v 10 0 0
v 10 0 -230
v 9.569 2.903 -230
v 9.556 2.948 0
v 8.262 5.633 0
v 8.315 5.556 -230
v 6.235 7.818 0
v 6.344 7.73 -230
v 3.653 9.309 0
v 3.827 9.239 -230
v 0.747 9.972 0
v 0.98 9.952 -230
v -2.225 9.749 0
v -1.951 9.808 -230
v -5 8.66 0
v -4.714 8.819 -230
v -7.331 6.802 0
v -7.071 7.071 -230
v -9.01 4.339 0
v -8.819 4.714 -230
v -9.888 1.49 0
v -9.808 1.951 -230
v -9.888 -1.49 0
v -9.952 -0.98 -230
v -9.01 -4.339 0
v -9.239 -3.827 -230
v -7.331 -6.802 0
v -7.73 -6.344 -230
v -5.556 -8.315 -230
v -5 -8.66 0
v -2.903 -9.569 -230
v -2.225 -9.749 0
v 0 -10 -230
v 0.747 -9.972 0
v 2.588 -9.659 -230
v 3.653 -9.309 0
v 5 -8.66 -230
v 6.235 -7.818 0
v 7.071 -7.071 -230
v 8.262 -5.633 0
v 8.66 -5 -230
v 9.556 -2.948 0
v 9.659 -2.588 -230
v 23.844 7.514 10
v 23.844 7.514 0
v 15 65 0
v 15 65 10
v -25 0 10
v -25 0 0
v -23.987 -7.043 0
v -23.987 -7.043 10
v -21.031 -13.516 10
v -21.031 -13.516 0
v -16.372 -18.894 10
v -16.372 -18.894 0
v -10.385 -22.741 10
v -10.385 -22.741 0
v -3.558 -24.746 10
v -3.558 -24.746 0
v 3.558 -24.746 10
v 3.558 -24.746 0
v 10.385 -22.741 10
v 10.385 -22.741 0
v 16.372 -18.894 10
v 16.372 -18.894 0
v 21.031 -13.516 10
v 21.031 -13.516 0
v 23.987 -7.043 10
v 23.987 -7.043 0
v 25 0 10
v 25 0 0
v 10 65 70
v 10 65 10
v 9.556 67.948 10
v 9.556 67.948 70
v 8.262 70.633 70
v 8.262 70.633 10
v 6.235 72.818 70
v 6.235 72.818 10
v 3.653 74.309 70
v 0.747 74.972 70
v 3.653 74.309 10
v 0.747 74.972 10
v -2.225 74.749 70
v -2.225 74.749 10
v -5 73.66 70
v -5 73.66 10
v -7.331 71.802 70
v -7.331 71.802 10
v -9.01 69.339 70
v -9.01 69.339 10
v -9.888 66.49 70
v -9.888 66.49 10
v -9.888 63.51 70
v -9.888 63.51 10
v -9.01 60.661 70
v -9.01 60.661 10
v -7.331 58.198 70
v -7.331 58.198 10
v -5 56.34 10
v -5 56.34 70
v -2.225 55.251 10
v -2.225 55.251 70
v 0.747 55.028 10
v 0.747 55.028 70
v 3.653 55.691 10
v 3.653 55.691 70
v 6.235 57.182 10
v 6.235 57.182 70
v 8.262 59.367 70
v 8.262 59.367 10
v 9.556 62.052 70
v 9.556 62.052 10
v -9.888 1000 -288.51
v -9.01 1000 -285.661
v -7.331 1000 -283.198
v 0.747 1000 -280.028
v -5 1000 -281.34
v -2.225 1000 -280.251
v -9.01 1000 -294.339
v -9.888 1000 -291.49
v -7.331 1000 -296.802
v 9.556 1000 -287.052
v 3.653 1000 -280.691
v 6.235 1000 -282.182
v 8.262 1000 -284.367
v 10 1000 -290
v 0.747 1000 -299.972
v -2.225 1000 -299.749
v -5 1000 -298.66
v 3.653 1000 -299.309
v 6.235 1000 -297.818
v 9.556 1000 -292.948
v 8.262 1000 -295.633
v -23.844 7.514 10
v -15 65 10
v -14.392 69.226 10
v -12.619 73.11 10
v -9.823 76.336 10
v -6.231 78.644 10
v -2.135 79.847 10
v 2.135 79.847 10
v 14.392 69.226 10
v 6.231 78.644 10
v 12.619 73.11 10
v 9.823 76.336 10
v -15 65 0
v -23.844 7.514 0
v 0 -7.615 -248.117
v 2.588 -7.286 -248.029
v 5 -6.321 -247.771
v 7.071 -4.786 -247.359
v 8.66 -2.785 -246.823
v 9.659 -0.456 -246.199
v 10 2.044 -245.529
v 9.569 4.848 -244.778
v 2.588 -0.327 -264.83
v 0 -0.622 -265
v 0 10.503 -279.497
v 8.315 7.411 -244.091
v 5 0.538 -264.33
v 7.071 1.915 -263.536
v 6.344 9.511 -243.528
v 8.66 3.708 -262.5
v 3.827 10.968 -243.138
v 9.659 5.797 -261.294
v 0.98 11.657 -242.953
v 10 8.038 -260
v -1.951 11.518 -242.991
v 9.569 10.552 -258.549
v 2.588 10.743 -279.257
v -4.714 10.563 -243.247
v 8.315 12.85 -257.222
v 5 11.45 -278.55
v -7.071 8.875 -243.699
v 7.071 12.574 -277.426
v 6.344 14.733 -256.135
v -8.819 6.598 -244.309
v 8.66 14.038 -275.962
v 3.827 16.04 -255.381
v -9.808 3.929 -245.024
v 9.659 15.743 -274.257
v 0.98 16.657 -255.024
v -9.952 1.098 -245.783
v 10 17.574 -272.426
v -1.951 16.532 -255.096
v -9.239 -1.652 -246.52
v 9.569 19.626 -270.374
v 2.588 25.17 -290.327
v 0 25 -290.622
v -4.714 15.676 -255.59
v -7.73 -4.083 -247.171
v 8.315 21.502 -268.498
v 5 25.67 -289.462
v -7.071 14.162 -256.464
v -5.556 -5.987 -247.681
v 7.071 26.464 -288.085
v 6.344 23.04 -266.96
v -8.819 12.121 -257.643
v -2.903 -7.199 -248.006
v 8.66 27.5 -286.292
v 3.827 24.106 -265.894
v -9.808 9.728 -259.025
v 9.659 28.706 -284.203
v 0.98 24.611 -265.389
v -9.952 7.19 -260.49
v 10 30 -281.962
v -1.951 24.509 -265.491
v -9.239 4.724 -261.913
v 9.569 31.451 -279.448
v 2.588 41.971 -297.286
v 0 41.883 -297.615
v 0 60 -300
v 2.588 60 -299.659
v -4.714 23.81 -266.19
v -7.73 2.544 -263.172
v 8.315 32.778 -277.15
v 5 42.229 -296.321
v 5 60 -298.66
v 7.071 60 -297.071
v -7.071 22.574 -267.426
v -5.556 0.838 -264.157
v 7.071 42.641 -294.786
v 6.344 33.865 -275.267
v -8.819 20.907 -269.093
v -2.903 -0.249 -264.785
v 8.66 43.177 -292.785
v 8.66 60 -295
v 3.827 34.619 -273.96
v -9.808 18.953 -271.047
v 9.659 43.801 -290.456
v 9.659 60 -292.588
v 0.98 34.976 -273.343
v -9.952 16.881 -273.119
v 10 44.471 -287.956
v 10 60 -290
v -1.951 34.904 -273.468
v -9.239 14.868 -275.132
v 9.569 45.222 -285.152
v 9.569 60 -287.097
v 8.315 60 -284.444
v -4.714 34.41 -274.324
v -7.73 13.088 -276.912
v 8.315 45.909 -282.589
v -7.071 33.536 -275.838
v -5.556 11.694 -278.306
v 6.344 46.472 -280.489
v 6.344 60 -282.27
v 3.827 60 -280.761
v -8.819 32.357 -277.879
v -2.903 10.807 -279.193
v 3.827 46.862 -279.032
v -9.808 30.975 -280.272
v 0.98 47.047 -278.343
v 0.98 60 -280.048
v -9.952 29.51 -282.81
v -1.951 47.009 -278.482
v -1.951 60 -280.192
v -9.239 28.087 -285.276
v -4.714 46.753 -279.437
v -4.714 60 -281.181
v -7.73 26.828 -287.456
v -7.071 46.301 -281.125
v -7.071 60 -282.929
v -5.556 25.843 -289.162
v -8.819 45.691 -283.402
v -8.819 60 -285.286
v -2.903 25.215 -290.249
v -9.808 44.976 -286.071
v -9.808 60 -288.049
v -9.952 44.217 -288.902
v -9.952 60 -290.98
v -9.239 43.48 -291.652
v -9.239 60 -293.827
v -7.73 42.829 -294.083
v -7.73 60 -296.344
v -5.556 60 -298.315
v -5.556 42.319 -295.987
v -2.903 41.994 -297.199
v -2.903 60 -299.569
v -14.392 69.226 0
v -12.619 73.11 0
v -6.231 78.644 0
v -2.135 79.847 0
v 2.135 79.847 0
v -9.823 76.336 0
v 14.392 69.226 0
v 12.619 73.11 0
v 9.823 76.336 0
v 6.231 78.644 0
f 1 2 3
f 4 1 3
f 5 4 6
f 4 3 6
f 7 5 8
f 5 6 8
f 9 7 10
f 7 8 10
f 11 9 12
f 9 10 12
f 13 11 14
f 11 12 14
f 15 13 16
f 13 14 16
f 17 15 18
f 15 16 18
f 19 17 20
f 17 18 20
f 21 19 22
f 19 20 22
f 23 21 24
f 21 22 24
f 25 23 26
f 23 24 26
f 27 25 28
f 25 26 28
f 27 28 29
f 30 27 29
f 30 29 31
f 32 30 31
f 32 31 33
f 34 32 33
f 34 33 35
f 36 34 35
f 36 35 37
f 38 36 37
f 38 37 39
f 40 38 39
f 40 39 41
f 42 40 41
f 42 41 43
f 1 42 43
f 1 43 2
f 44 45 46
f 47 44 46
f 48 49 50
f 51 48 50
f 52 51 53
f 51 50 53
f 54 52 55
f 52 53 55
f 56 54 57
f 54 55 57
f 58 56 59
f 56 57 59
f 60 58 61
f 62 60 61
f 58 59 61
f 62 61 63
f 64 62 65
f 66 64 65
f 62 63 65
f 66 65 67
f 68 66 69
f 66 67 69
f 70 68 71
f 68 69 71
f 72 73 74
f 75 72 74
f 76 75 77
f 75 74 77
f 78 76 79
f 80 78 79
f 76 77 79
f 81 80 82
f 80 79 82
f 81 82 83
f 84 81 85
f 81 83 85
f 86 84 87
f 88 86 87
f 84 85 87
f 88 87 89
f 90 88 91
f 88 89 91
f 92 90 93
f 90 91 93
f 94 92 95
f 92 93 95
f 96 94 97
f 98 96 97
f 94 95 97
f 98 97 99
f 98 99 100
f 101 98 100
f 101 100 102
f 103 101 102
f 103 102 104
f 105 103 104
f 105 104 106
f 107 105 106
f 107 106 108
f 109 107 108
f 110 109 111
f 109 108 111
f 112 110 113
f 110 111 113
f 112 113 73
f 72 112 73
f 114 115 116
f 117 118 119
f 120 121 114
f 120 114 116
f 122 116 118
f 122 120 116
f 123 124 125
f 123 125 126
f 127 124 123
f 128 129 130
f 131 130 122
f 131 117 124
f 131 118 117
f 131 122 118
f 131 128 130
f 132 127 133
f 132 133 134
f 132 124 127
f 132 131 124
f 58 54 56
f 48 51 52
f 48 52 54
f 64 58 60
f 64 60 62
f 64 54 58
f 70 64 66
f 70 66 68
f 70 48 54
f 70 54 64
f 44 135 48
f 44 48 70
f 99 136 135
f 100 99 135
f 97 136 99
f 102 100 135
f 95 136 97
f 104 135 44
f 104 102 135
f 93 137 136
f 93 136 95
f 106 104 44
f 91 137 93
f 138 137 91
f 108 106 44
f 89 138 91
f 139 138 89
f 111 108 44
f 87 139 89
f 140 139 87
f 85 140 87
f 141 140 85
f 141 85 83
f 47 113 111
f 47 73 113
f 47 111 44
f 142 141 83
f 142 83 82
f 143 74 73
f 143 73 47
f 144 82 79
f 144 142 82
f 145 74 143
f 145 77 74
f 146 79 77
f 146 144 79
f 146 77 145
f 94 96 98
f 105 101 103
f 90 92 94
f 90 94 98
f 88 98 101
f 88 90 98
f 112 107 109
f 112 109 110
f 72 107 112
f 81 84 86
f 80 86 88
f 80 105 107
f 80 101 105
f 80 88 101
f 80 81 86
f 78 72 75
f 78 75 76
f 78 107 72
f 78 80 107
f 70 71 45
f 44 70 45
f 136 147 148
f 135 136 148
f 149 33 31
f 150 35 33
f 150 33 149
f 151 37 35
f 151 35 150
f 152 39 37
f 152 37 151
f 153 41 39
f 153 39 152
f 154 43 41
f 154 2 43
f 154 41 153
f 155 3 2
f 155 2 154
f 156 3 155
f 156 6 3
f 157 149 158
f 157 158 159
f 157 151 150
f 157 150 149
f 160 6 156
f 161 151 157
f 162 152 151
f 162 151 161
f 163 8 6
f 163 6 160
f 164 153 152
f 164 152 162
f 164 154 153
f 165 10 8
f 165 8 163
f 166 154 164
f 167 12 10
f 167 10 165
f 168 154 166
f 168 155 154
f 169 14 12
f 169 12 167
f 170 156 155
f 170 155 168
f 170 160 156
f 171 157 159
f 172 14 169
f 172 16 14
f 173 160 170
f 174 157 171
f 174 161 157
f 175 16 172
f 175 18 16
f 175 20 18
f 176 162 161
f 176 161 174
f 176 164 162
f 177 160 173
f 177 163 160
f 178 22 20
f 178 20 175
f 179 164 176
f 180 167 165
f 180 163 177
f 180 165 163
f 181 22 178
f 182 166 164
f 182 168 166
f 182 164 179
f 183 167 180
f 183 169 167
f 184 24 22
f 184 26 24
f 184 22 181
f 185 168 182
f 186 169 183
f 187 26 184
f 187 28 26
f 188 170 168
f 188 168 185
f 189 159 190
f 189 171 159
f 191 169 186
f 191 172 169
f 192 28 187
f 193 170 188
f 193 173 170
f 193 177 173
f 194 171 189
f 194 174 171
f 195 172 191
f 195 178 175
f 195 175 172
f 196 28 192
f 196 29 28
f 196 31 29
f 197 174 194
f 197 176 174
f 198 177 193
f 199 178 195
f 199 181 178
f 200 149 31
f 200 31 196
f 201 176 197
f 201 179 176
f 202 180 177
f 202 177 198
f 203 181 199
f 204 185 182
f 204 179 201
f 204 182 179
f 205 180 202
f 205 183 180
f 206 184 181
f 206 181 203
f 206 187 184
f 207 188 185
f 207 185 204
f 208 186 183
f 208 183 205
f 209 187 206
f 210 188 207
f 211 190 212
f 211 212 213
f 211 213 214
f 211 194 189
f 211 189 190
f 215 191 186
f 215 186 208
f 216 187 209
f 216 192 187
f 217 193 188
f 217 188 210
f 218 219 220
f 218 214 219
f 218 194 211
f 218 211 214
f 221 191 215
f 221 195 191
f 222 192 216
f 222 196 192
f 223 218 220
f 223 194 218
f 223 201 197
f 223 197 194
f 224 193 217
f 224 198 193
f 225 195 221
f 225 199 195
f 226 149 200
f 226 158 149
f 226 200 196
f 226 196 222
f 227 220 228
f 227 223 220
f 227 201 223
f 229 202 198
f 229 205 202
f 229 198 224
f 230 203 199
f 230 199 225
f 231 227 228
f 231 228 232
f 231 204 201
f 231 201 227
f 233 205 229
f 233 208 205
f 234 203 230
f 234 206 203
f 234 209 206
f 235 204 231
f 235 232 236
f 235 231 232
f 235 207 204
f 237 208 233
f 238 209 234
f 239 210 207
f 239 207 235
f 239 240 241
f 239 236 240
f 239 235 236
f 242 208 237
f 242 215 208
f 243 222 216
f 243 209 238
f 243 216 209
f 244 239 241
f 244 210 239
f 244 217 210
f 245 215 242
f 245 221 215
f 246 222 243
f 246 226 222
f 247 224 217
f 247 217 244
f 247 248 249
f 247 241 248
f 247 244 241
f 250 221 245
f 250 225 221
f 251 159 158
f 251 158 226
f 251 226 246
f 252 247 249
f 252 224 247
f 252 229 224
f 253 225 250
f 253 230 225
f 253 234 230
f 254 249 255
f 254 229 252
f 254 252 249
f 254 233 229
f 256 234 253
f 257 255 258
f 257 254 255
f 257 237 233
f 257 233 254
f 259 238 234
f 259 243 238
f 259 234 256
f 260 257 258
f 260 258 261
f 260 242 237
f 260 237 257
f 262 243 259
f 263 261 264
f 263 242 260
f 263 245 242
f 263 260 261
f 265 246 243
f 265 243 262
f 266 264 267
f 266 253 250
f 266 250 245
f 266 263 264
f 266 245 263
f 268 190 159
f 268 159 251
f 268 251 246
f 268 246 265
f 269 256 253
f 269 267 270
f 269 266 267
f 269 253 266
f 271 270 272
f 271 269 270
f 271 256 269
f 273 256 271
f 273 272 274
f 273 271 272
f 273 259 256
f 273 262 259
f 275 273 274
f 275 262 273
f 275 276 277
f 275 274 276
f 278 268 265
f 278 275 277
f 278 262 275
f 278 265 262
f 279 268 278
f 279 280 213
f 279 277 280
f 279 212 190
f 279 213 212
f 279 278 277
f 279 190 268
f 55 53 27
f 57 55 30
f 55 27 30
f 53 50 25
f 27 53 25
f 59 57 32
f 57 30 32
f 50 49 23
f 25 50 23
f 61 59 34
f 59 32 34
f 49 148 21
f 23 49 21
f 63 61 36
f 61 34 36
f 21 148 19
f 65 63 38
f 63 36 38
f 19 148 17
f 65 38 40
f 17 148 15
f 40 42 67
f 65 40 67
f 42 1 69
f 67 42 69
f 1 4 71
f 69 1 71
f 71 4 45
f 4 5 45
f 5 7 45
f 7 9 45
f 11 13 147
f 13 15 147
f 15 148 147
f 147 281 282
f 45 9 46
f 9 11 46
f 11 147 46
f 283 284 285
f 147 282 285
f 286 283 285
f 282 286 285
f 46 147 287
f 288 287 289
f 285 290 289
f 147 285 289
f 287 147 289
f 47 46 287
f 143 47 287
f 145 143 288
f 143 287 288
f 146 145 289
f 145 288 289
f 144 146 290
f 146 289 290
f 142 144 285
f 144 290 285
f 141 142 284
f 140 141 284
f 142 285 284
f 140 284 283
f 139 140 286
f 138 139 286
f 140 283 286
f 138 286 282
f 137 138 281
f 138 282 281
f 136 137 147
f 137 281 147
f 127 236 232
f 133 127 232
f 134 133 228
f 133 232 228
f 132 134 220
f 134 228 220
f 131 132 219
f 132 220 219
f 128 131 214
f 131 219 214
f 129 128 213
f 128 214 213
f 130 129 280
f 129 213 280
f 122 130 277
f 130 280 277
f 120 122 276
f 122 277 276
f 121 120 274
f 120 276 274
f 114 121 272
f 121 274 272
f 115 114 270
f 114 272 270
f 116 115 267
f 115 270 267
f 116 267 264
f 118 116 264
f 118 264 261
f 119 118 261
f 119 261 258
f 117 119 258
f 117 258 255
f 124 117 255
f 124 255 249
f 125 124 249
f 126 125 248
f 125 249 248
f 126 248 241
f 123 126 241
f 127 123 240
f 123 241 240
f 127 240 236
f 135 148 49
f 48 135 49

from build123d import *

# Parameters (mm, degrees)
SKETCH1_R           = 10
BOSS_EXTRUDE1_DEPTH = 10
SKETCH2_R           = 10
BOSS_EXTRUDE2_DEPTH = 60
SWEEP1_START        = 59.9999999
SWEEP1_OUTLINE_R    = 10
SWEEP1_DEPTH        = 940.0000001
SWEEP1_START_2      = -230.0000001
SWEEP1_2_OUTLINE_R  = 10
SWEEP1_2_DEPTH      = 240.0000001
SWEEP1_3_OUTLINE_R  = 10
SWEEP1_3_ANGLE      = 90


with BuildPart() as part:
    # Sketch1 → Boss-Extrude1 (new body)
    with BuildSketch(Plane.XY):
        with BuildLine():
            ThreePointArc((15, 65), (0, 80), (-15, 65))
            Line((-15, 65), (-23.843930636, 7.514450867))
            Line((-23.843930636, 7.514450867), (-25, 0))
            ThreePointArc((-25, 0), (0, -25), (25, 0))
            Line((25, 0), (23.843930636, 7.514450867))
            Line((23.843930636, 7.514450867), (15, 65))
        make_face()
        Circle(SKETCH1_R, mode=Mode.SUBTRACT)
    extrude(amount=BOSS_EXTRUDE1_DEPTH)

    # Sketch2 → Boss-Extrude2 (add)
    with BuildSketch(Plane.XY.offset(10)):
        with Locations((0, 65)):
            Circle(SKETCH2_R)
    extrude(amount=BOSS_EXTRUDE2_DEPTH)

    # Sweep1 2 outline → Sweep1 2 (add)
    with BuildSketch(Plane.XY.offset(SWEEP1_START_2)):
        Circle(SWEEP1_2_OUTLINE_R)
    extrude(amount=SWEEP1_2_DEPTH)



with BuildPart() as body_2:
    # Sweep1: read off the stored shape, not the designer's step
    # Sweep1 outline → Sweep1 (new body)
    with BuildSketch(Plane(origin=(0, 0, 0), x_dir=(1, 0, 0), z_dir=(0, 1, 0)).offset(SWEEP1_START)):
        with Locations((0, 290)):
            Circle(SWEEP1_OUTLINE_R)
    extrude(amount=SWEEP1_DEPTH)


with BuildPart() as part_1:
    add(part.part)

    add(body_2.part)  # Sweep1 3 merges body 2
    # Sweep1 3 outline → Sweep1 3 (revolve)
    with BuildSketch(Plane(origin=(0, 60, -230), x_dir=(0, -1, 0), z_dir=(0, 0, 1))):
        with Locations((60, 0)):
            Circle(SWEEP1_3_OUTLINE_R)
    revolve(axis=Axis((0, 60, -230), (1, 0, 0)), revolution_arc=SWEEP1_3_ANGLE)


solid = part_1.part
